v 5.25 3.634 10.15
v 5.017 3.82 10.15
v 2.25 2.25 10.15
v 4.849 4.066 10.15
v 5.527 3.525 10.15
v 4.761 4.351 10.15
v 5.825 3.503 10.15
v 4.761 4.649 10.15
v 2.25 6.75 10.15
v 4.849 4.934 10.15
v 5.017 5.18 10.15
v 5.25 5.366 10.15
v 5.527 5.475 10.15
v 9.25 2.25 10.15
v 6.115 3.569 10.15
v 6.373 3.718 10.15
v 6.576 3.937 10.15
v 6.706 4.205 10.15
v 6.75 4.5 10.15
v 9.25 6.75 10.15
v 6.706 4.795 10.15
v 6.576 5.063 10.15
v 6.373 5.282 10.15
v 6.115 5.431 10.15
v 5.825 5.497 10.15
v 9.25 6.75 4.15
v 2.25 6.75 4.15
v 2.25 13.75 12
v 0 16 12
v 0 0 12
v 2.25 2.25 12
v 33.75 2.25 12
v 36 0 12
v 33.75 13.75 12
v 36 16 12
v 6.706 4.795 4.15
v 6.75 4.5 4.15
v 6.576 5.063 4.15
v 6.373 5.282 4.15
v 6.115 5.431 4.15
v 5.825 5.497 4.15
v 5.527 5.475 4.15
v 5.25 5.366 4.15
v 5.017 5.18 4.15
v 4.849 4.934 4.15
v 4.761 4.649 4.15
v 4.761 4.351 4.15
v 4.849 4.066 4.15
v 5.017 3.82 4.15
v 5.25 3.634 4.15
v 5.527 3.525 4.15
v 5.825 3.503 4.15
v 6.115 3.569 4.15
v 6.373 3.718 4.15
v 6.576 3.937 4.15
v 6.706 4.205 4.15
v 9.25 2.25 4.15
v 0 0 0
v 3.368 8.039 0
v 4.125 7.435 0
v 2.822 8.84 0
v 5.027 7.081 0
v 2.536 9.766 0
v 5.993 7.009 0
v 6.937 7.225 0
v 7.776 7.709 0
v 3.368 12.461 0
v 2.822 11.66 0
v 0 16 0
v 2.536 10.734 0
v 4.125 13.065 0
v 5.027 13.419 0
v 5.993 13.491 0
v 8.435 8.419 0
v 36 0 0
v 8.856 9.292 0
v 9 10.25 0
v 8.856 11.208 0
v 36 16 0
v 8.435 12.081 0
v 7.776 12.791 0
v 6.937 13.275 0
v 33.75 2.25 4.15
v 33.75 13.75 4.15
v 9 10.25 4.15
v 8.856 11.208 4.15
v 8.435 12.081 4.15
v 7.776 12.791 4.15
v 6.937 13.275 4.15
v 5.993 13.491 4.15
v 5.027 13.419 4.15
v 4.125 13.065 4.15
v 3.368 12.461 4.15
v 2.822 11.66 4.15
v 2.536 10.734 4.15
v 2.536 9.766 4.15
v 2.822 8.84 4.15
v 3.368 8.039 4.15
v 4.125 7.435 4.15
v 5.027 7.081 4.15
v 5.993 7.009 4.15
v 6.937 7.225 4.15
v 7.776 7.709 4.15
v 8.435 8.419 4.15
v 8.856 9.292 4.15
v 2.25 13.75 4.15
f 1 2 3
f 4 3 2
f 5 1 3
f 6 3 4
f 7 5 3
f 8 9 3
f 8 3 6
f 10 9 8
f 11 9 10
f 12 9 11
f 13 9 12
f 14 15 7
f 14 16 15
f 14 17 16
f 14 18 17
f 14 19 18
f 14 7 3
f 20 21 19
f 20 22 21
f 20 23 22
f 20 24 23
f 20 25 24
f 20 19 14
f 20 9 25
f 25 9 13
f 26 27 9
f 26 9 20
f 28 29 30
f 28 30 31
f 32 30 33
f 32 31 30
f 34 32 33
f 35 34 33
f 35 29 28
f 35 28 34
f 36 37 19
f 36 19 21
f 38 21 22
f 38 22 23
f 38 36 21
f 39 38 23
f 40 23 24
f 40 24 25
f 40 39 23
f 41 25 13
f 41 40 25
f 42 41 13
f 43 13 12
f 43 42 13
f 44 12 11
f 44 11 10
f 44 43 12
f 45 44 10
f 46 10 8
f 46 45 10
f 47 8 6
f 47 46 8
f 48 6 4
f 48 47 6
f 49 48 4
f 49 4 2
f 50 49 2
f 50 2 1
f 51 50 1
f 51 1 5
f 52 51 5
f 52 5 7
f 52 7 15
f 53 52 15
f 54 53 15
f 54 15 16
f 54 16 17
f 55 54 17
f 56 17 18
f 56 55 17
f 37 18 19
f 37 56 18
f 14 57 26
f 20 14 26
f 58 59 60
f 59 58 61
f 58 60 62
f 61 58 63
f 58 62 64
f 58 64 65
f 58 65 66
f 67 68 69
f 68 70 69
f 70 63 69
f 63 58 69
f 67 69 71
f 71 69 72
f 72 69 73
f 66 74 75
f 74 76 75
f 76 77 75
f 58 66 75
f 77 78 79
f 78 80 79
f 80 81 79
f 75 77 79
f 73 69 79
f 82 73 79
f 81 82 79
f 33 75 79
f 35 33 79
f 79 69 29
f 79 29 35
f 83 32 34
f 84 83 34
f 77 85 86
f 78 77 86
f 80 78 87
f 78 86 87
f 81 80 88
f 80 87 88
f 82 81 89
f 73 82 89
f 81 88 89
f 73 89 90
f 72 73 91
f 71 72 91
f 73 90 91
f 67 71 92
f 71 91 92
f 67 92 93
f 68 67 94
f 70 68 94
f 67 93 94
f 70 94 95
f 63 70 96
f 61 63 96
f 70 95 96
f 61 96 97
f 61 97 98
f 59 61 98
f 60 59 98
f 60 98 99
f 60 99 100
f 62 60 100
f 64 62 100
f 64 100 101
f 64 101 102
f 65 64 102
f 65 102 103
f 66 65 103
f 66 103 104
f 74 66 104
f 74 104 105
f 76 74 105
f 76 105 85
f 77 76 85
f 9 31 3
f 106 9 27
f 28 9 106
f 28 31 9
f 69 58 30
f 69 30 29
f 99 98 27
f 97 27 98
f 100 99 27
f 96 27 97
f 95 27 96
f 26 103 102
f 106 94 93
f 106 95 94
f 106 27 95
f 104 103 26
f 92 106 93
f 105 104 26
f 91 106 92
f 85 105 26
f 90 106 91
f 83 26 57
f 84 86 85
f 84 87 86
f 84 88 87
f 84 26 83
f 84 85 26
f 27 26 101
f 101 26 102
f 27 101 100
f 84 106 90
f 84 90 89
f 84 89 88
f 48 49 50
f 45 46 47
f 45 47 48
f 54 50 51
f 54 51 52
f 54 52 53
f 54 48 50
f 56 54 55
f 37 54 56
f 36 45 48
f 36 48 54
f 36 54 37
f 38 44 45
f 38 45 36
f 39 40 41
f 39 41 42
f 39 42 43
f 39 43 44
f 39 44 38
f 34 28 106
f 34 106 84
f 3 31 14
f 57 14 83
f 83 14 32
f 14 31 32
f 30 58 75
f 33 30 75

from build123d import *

# Parameters (mm, degrees)
SKETCH_W        = 36
SKETCH_H        = 16
PAD_DEPTH       = 12
SKETCH001_W     = 31.5
SKETCH001_H     = 11.5
POCKET_DEPTH    = 7.85
SKETCH002_W     = 7
SKETCH002_H     = 4.5
SKETCH002_R     = 1
PAD001_DEPTH    = 6
SKETCH003_R     = 3.25
POCKET001_DEPTH = 5


with BuildPart() as part:
    # Sketch → Pad (new body)
    with BuildSketch(Plane.XY):
        with Locations((18, 8)):
            Rectangle(SKETCH_W, SKETCH_H)
    extrude(amount=PAD_DEPTH)

    # Sketch001 (on Face6 of Pad) → Pocket (cut)
    with BuildSketch(Plane.XY.offset(12)):
        with Locations((18, 8)):
            Rectangle(SKETCH001_W, SKETCH001_H)
    extrude(amount=-POCKET_DEPTH, mode=Mode.SUBTRACT)

    # Sketch002 (on Face11 of Pocket) → Pad001 (join)
    with BuildSketch(Plane.XY.offset(4.15)):
        with Locations((5.75, 4.5)):
            Rectangle(SKETCH002_W, SKETCH002_H)
        with Locations((5.75, 4.5)):
            Circle(SKETCH002_R, mode=Mode.SUBTRACT)
    extrude(amount=PAD001_DEPTH)

    # Sketch003 (on Face11 of Pad001) → Pocket001 (cut)
    with BuildSketch(Plane.XY.offset(4.15)):
        with Locations((5.75, 10.25)):
            Circle(SKETCH003_R)
    extrude(amount=-POCKET001_DEPTH, mode=Mode.SUBTRACT)


solid = part.part
